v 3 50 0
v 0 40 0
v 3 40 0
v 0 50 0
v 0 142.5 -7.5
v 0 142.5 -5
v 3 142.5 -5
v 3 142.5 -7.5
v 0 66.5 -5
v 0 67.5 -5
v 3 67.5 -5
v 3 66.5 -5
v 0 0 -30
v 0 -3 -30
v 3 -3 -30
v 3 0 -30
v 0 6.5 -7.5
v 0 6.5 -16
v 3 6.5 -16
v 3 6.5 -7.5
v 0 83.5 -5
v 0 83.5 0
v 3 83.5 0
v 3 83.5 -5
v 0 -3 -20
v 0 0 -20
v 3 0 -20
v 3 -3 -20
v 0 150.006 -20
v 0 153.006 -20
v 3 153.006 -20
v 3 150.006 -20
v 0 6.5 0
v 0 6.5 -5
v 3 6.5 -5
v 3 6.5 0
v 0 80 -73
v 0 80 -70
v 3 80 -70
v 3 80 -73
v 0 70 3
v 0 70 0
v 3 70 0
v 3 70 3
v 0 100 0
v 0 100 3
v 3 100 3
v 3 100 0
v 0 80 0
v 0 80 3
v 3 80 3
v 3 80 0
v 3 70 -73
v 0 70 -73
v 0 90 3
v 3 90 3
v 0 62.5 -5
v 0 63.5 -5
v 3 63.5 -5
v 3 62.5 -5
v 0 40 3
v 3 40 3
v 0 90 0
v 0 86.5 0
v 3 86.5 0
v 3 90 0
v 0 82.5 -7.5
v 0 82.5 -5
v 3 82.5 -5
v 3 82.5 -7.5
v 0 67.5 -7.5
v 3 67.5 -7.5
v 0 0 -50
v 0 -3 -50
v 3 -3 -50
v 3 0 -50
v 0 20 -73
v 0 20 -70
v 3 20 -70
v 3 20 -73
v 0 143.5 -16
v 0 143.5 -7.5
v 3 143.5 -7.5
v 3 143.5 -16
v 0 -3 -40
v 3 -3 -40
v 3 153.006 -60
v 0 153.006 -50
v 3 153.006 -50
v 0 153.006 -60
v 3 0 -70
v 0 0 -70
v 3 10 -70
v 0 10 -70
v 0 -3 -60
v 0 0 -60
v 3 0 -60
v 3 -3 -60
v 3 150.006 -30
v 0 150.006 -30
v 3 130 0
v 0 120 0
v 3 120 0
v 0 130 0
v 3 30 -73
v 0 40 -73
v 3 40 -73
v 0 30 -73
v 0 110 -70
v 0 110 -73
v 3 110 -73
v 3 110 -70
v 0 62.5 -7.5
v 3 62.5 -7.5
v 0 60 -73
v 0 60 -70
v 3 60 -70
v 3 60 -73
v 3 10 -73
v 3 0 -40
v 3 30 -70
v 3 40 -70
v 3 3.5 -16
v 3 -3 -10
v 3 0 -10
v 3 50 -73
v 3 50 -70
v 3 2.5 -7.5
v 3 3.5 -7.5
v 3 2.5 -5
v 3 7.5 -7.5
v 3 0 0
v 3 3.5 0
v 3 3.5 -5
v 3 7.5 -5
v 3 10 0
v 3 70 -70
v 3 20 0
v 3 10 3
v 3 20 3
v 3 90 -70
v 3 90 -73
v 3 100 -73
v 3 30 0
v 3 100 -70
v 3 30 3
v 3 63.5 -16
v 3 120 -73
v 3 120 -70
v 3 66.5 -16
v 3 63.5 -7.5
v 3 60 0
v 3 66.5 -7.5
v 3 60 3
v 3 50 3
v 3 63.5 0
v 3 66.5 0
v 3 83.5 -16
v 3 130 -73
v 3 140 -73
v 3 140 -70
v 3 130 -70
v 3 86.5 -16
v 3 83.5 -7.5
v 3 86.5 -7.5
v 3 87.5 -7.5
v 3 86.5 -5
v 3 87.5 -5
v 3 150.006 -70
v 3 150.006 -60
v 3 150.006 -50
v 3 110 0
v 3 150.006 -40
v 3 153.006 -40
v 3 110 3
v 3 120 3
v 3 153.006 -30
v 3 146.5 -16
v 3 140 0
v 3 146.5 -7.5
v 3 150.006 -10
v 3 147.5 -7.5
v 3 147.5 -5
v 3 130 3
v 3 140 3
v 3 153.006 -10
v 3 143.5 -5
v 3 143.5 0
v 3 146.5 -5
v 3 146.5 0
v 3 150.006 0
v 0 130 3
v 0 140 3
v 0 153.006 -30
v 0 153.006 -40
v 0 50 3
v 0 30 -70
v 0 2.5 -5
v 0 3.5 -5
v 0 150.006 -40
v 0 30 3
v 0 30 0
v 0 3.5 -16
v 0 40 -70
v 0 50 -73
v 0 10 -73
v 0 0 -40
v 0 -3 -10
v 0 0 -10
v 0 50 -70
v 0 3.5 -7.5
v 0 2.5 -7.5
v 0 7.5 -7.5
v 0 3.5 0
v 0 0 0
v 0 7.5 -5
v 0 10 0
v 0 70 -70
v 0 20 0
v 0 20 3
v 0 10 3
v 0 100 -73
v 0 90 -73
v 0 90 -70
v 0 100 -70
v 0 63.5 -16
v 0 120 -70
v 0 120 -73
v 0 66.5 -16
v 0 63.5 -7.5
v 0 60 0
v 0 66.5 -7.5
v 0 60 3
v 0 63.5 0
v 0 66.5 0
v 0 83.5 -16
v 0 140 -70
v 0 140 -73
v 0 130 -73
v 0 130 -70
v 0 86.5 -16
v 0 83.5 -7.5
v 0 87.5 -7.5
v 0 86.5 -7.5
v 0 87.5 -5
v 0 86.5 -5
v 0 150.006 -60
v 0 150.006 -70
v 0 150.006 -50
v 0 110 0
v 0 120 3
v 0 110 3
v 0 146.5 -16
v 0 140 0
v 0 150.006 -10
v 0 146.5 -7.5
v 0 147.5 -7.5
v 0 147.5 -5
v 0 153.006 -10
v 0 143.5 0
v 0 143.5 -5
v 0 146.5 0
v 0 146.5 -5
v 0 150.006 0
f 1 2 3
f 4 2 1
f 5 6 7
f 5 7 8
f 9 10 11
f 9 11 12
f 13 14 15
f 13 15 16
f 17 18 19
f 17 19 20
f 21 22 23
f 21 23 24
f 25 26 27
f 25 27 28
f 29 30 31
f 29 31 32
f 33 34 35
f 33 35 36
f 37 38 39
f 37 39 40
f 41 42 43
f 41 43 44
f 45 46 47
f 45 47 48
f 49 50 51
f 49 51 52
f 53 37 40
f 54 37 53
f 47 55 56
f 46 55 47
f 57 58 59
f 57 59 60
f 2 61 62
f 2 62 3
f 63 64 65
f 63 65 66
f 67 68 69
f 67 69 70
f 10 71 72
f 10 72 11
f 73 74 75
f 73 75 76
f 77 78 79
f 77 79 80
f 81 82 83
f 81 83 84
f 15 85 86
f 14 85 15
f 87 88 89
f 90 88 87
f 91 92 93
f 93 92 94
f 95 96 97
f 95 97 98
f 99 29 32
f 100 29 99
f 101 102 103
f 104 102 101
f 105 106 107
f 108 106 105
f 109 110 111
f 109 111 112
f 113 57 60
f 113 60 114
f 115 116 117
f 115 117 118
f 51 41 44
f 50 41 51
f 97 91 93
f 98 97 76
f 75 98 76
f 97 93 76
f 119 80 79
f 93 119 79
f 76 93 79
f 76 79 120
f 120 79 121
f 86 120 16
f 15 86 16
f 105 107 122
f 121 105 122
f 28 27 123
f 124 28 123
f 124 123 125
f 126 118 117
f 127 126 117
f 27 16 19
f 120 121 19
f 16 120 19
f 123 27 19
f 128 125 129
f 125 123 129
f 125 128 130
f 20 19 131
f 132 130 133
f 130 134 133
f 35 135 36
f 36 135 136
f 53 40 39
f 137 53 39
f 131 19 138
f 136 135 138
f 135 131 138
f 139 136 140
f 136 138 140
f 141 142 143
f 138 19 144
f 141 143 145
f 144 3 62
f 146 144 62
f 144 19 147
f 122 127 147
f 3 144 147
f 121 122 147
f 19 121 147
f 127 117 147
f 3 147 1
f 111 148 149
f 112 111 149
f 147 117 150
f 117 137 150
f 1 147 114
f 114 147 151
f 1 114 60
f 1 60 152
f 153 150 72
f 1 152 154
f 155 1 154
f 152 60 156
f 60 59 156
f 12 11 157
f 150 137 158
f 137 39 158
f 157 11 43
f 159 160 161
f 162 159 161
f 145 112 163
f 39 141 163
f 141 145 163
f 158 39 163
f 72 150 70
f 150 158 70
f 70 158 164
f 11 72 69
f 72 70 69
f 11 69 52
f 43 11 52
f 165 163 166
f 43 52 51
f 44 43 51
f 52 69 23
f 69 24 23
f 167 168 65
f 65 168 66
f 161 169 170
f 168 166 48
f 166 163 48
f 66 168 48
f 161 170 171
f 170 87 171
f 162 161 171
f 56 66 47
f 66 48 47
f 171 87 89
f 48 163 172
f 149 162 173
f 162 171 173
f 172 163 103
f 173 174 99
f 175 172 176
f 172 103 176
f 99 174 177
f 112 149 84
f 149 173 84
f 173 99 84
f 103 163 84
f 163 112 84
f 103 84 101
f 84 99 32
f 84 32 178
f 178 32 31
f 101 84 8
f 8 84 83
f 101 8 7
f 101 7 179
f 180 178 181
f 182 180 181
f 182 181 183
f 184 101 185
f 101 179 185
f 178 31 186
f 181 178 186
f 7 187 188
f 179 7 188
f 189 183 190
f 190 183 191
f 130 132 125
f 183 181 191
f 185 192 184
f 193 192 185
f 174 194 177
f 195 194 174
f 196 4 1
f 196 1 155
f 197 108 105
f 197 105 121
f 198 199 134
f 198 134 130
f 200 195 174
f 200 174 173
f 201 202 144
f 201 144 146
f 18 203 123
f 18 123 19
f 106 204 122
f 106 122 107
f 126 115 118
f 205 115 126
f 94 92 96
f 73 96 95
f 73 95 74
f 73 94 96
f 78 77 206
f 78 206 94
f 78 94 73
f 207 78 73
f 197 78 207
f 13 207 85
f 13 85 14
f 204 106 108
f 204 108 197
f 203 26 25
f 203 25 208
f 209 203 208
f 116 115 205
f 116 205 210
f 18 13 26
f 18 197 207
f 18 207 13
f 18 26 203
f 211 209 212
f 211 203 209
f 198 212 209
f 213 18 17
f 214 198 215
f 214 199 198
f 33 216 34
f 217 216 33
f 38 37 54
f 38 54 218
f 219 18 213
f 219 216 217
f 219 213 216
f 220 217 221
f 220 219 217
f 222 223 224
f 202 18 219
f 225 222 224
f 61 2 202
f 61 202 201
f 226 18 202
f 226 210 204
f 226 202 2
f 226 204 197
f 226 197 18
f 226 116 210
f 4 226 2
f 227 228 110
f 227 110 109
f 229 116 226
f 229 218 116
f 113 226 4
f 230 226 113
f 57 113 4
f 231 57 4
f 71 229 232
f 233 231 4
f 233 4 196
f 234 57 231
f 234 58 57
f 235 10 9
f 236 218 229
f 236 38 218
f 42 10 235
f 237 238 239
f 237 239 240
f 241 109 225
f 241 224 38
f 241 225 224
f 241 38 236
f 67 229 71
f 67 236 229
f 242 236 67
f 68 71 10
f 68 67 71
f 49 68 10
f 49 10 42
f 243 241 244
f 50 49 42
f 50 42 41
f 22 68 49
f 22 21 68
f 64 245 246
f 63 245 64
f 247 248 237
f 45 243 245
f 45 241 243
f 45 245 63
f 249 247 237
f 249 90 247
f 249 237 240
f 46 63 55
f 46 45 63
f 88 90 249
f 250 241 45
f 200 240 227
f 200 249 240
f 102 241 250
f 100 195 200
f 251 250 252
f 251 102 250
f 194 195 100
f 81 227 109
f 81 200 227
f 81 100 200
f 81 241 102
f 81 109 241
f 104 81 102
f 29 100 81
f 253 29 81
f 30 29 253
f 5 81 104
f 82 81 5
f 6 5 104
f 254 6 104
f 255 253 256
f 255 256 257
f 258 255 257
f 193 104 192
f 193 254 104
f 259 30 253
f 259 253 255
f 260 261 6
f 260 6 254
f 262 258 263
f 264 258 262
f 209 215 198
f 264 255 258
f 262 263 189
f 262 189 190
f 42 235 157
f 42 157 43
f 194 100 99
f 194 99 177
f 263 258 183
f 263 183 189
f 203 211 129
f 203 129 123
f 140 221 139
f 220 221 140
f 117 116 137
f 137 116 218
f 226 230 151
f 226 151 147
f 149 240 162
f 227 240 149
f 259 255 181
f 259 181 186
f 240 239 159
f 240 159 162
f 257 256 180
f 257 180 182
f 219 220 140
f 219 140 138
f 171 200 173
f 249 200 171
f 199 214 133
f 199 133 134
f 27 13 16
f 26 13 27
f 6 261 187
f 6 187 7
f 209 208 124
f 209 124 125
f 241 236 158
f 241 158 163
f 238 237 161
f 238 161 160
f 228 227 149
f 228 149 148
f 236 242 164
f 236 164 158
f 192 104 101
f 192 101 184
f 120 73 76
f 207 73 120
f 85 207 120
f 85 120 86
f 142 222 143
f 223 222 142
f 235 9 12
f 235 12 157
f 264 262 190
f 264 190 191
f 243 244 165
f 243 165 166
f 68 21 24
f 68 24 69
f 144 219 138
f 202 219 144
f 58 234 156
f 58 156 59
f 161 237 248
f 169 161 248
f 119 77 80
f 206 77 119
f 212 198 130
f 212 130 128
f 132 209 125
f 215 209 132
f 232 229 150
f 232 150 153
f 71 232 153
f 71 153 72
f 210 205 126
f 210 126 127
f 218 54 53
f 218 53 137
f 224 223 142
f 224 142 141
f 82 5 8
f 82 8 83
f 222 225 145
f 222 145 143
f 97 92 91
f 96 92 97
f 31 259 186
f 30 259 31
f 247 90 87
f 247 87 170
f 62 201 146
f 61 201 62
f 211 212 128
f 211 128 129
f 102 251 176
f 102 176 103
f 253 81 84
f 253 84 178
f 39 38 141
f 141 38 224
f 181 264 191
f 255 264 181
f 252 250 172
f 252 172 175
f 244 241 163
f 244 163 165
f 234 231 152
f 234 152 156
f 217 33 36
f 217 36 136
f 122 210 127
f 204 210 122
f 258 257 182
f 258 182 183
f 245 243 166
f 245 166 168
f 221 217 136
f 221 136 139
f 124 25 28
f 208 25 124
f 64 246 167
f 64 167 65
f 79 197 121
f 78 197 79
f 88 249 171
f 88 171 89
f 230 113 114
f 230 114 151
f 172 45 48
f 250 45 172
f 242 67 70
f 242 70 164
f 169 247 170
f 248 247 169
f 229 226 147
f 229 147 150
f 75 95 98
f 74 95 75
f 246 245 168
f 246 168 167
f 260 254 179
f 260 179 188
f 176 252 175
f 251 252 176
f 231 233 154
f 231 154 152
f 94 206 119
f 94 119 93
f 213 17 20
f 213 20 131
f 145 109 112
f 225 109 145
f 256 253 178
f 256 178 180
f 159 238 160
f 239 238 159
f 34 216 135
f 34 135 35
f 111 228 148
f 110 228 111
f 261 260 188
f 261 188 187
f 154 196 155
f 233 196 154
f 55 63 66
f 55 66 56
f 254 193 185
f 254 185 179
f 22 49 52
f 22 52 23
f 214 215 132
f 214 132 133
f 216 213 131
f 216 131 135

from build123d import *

# Parameters (mm, degrees)
BOSS_EXTRUDE1_DEPTH = 3


with BuildPart() as part:
    # Sketch1 → Boss-Extrude1 (new body)
    with BuildSketch(Plane(origin=(0, 0, 0), x_dir=(0, 0, -1), z_dir=(1, 0, 0))):
        Polygon((10, 153.005875518), (20, 153.005875518), (20, 150.005875518), (30, 150.005875518), (30, 153.005875518), (40, 153.005875518), (40, 150.005875518), (50, 150.005875518), (50, 153.005875518), (60, 153.005875518), (60, 150.005875518), (70, 150.005875518), (70, 146.5), (70, 143.5), (70, 140), (73, 140), (73, 130), (70, 130), (70, 120), (73, 120), (73, 110), (70, 110), (70, 100), (73, 100), (73, 90), (70, 90), (70, 83.5), (70, 80), (73, 80), (73, 70), (70, 70), (70, 66.5), (70, 63.5), (70, 60), (73, 60), (73, 50), (70, 50), (70, 40), (73, 40), (73, 30), (70, 30), (70, 20), (73, 20), (73, 10), (70, 10), (70, 6.5), (70, 3.5), (70, 0), (60, 0), (60, -3), (50, -3), (50, 0), (40, 0), (40, -3), (30, -3), (30, 0), (20, 0), (20, -3), (10, -3), (10, 0), (0, 0), (0, 3.5), (5, 3.5), (5, 2.5), (7.5, 2.5), (7.5, 3.5), (16, 3.5), (16, 6.5), (7.5, 6.5), (7.5, 7.5), (5, 7.5), (5, 6.5), (0, 6.5), (0, 10), (-3, 10), (-3, 20), (0, 20), (0, 30), (-3, 30), (-3, 40), (0, 40), (0, 50), (-3, 50), (-3, 60), (0, 60), (0, 63.5), (5, 63.5), (5, 62.5), (7.5, 62.5), (7.5, 63.5), (16, 63.5), (16, 66.5), (7.5, 66.5), (7.5, 67.5), (5, 67.5), (5, 66.5), (0, 66.5), (0, 70), (-3, 70), (-3, 80), (0, 80), (0, 83.5), (5, 83.5), (5, 82.5), (7.5, 82.5), (7.5, 83.5), (16, 83.5), (16, 86.5), (7.5, 86.5), (7.5, 87.5), (5, 87.5), (5, 86.5), (0, 86.5), (0, 90), (-3, 90), (-3, 100), (0, 100), (0, 110), (-3, 110), (-3, 120), (0, 120), (0, 130), (-3, 130), (-3, 140), (0, 140), (0, 143.5), (5, 143.5), (5, 142.5), (7.5, 142.5), (7.5, 143.5), (16, 143.5), (16, 146.5), (7.5, 146.5), (7.5, 147.5), (5, 147.5), (5, 146.5), (0, 146.5), (0, 150.005875518), (10, 150.005875518), align=None)
    extrude(amount=BOSS_EXTRUDE1_DEPTH)


solid = part.part
